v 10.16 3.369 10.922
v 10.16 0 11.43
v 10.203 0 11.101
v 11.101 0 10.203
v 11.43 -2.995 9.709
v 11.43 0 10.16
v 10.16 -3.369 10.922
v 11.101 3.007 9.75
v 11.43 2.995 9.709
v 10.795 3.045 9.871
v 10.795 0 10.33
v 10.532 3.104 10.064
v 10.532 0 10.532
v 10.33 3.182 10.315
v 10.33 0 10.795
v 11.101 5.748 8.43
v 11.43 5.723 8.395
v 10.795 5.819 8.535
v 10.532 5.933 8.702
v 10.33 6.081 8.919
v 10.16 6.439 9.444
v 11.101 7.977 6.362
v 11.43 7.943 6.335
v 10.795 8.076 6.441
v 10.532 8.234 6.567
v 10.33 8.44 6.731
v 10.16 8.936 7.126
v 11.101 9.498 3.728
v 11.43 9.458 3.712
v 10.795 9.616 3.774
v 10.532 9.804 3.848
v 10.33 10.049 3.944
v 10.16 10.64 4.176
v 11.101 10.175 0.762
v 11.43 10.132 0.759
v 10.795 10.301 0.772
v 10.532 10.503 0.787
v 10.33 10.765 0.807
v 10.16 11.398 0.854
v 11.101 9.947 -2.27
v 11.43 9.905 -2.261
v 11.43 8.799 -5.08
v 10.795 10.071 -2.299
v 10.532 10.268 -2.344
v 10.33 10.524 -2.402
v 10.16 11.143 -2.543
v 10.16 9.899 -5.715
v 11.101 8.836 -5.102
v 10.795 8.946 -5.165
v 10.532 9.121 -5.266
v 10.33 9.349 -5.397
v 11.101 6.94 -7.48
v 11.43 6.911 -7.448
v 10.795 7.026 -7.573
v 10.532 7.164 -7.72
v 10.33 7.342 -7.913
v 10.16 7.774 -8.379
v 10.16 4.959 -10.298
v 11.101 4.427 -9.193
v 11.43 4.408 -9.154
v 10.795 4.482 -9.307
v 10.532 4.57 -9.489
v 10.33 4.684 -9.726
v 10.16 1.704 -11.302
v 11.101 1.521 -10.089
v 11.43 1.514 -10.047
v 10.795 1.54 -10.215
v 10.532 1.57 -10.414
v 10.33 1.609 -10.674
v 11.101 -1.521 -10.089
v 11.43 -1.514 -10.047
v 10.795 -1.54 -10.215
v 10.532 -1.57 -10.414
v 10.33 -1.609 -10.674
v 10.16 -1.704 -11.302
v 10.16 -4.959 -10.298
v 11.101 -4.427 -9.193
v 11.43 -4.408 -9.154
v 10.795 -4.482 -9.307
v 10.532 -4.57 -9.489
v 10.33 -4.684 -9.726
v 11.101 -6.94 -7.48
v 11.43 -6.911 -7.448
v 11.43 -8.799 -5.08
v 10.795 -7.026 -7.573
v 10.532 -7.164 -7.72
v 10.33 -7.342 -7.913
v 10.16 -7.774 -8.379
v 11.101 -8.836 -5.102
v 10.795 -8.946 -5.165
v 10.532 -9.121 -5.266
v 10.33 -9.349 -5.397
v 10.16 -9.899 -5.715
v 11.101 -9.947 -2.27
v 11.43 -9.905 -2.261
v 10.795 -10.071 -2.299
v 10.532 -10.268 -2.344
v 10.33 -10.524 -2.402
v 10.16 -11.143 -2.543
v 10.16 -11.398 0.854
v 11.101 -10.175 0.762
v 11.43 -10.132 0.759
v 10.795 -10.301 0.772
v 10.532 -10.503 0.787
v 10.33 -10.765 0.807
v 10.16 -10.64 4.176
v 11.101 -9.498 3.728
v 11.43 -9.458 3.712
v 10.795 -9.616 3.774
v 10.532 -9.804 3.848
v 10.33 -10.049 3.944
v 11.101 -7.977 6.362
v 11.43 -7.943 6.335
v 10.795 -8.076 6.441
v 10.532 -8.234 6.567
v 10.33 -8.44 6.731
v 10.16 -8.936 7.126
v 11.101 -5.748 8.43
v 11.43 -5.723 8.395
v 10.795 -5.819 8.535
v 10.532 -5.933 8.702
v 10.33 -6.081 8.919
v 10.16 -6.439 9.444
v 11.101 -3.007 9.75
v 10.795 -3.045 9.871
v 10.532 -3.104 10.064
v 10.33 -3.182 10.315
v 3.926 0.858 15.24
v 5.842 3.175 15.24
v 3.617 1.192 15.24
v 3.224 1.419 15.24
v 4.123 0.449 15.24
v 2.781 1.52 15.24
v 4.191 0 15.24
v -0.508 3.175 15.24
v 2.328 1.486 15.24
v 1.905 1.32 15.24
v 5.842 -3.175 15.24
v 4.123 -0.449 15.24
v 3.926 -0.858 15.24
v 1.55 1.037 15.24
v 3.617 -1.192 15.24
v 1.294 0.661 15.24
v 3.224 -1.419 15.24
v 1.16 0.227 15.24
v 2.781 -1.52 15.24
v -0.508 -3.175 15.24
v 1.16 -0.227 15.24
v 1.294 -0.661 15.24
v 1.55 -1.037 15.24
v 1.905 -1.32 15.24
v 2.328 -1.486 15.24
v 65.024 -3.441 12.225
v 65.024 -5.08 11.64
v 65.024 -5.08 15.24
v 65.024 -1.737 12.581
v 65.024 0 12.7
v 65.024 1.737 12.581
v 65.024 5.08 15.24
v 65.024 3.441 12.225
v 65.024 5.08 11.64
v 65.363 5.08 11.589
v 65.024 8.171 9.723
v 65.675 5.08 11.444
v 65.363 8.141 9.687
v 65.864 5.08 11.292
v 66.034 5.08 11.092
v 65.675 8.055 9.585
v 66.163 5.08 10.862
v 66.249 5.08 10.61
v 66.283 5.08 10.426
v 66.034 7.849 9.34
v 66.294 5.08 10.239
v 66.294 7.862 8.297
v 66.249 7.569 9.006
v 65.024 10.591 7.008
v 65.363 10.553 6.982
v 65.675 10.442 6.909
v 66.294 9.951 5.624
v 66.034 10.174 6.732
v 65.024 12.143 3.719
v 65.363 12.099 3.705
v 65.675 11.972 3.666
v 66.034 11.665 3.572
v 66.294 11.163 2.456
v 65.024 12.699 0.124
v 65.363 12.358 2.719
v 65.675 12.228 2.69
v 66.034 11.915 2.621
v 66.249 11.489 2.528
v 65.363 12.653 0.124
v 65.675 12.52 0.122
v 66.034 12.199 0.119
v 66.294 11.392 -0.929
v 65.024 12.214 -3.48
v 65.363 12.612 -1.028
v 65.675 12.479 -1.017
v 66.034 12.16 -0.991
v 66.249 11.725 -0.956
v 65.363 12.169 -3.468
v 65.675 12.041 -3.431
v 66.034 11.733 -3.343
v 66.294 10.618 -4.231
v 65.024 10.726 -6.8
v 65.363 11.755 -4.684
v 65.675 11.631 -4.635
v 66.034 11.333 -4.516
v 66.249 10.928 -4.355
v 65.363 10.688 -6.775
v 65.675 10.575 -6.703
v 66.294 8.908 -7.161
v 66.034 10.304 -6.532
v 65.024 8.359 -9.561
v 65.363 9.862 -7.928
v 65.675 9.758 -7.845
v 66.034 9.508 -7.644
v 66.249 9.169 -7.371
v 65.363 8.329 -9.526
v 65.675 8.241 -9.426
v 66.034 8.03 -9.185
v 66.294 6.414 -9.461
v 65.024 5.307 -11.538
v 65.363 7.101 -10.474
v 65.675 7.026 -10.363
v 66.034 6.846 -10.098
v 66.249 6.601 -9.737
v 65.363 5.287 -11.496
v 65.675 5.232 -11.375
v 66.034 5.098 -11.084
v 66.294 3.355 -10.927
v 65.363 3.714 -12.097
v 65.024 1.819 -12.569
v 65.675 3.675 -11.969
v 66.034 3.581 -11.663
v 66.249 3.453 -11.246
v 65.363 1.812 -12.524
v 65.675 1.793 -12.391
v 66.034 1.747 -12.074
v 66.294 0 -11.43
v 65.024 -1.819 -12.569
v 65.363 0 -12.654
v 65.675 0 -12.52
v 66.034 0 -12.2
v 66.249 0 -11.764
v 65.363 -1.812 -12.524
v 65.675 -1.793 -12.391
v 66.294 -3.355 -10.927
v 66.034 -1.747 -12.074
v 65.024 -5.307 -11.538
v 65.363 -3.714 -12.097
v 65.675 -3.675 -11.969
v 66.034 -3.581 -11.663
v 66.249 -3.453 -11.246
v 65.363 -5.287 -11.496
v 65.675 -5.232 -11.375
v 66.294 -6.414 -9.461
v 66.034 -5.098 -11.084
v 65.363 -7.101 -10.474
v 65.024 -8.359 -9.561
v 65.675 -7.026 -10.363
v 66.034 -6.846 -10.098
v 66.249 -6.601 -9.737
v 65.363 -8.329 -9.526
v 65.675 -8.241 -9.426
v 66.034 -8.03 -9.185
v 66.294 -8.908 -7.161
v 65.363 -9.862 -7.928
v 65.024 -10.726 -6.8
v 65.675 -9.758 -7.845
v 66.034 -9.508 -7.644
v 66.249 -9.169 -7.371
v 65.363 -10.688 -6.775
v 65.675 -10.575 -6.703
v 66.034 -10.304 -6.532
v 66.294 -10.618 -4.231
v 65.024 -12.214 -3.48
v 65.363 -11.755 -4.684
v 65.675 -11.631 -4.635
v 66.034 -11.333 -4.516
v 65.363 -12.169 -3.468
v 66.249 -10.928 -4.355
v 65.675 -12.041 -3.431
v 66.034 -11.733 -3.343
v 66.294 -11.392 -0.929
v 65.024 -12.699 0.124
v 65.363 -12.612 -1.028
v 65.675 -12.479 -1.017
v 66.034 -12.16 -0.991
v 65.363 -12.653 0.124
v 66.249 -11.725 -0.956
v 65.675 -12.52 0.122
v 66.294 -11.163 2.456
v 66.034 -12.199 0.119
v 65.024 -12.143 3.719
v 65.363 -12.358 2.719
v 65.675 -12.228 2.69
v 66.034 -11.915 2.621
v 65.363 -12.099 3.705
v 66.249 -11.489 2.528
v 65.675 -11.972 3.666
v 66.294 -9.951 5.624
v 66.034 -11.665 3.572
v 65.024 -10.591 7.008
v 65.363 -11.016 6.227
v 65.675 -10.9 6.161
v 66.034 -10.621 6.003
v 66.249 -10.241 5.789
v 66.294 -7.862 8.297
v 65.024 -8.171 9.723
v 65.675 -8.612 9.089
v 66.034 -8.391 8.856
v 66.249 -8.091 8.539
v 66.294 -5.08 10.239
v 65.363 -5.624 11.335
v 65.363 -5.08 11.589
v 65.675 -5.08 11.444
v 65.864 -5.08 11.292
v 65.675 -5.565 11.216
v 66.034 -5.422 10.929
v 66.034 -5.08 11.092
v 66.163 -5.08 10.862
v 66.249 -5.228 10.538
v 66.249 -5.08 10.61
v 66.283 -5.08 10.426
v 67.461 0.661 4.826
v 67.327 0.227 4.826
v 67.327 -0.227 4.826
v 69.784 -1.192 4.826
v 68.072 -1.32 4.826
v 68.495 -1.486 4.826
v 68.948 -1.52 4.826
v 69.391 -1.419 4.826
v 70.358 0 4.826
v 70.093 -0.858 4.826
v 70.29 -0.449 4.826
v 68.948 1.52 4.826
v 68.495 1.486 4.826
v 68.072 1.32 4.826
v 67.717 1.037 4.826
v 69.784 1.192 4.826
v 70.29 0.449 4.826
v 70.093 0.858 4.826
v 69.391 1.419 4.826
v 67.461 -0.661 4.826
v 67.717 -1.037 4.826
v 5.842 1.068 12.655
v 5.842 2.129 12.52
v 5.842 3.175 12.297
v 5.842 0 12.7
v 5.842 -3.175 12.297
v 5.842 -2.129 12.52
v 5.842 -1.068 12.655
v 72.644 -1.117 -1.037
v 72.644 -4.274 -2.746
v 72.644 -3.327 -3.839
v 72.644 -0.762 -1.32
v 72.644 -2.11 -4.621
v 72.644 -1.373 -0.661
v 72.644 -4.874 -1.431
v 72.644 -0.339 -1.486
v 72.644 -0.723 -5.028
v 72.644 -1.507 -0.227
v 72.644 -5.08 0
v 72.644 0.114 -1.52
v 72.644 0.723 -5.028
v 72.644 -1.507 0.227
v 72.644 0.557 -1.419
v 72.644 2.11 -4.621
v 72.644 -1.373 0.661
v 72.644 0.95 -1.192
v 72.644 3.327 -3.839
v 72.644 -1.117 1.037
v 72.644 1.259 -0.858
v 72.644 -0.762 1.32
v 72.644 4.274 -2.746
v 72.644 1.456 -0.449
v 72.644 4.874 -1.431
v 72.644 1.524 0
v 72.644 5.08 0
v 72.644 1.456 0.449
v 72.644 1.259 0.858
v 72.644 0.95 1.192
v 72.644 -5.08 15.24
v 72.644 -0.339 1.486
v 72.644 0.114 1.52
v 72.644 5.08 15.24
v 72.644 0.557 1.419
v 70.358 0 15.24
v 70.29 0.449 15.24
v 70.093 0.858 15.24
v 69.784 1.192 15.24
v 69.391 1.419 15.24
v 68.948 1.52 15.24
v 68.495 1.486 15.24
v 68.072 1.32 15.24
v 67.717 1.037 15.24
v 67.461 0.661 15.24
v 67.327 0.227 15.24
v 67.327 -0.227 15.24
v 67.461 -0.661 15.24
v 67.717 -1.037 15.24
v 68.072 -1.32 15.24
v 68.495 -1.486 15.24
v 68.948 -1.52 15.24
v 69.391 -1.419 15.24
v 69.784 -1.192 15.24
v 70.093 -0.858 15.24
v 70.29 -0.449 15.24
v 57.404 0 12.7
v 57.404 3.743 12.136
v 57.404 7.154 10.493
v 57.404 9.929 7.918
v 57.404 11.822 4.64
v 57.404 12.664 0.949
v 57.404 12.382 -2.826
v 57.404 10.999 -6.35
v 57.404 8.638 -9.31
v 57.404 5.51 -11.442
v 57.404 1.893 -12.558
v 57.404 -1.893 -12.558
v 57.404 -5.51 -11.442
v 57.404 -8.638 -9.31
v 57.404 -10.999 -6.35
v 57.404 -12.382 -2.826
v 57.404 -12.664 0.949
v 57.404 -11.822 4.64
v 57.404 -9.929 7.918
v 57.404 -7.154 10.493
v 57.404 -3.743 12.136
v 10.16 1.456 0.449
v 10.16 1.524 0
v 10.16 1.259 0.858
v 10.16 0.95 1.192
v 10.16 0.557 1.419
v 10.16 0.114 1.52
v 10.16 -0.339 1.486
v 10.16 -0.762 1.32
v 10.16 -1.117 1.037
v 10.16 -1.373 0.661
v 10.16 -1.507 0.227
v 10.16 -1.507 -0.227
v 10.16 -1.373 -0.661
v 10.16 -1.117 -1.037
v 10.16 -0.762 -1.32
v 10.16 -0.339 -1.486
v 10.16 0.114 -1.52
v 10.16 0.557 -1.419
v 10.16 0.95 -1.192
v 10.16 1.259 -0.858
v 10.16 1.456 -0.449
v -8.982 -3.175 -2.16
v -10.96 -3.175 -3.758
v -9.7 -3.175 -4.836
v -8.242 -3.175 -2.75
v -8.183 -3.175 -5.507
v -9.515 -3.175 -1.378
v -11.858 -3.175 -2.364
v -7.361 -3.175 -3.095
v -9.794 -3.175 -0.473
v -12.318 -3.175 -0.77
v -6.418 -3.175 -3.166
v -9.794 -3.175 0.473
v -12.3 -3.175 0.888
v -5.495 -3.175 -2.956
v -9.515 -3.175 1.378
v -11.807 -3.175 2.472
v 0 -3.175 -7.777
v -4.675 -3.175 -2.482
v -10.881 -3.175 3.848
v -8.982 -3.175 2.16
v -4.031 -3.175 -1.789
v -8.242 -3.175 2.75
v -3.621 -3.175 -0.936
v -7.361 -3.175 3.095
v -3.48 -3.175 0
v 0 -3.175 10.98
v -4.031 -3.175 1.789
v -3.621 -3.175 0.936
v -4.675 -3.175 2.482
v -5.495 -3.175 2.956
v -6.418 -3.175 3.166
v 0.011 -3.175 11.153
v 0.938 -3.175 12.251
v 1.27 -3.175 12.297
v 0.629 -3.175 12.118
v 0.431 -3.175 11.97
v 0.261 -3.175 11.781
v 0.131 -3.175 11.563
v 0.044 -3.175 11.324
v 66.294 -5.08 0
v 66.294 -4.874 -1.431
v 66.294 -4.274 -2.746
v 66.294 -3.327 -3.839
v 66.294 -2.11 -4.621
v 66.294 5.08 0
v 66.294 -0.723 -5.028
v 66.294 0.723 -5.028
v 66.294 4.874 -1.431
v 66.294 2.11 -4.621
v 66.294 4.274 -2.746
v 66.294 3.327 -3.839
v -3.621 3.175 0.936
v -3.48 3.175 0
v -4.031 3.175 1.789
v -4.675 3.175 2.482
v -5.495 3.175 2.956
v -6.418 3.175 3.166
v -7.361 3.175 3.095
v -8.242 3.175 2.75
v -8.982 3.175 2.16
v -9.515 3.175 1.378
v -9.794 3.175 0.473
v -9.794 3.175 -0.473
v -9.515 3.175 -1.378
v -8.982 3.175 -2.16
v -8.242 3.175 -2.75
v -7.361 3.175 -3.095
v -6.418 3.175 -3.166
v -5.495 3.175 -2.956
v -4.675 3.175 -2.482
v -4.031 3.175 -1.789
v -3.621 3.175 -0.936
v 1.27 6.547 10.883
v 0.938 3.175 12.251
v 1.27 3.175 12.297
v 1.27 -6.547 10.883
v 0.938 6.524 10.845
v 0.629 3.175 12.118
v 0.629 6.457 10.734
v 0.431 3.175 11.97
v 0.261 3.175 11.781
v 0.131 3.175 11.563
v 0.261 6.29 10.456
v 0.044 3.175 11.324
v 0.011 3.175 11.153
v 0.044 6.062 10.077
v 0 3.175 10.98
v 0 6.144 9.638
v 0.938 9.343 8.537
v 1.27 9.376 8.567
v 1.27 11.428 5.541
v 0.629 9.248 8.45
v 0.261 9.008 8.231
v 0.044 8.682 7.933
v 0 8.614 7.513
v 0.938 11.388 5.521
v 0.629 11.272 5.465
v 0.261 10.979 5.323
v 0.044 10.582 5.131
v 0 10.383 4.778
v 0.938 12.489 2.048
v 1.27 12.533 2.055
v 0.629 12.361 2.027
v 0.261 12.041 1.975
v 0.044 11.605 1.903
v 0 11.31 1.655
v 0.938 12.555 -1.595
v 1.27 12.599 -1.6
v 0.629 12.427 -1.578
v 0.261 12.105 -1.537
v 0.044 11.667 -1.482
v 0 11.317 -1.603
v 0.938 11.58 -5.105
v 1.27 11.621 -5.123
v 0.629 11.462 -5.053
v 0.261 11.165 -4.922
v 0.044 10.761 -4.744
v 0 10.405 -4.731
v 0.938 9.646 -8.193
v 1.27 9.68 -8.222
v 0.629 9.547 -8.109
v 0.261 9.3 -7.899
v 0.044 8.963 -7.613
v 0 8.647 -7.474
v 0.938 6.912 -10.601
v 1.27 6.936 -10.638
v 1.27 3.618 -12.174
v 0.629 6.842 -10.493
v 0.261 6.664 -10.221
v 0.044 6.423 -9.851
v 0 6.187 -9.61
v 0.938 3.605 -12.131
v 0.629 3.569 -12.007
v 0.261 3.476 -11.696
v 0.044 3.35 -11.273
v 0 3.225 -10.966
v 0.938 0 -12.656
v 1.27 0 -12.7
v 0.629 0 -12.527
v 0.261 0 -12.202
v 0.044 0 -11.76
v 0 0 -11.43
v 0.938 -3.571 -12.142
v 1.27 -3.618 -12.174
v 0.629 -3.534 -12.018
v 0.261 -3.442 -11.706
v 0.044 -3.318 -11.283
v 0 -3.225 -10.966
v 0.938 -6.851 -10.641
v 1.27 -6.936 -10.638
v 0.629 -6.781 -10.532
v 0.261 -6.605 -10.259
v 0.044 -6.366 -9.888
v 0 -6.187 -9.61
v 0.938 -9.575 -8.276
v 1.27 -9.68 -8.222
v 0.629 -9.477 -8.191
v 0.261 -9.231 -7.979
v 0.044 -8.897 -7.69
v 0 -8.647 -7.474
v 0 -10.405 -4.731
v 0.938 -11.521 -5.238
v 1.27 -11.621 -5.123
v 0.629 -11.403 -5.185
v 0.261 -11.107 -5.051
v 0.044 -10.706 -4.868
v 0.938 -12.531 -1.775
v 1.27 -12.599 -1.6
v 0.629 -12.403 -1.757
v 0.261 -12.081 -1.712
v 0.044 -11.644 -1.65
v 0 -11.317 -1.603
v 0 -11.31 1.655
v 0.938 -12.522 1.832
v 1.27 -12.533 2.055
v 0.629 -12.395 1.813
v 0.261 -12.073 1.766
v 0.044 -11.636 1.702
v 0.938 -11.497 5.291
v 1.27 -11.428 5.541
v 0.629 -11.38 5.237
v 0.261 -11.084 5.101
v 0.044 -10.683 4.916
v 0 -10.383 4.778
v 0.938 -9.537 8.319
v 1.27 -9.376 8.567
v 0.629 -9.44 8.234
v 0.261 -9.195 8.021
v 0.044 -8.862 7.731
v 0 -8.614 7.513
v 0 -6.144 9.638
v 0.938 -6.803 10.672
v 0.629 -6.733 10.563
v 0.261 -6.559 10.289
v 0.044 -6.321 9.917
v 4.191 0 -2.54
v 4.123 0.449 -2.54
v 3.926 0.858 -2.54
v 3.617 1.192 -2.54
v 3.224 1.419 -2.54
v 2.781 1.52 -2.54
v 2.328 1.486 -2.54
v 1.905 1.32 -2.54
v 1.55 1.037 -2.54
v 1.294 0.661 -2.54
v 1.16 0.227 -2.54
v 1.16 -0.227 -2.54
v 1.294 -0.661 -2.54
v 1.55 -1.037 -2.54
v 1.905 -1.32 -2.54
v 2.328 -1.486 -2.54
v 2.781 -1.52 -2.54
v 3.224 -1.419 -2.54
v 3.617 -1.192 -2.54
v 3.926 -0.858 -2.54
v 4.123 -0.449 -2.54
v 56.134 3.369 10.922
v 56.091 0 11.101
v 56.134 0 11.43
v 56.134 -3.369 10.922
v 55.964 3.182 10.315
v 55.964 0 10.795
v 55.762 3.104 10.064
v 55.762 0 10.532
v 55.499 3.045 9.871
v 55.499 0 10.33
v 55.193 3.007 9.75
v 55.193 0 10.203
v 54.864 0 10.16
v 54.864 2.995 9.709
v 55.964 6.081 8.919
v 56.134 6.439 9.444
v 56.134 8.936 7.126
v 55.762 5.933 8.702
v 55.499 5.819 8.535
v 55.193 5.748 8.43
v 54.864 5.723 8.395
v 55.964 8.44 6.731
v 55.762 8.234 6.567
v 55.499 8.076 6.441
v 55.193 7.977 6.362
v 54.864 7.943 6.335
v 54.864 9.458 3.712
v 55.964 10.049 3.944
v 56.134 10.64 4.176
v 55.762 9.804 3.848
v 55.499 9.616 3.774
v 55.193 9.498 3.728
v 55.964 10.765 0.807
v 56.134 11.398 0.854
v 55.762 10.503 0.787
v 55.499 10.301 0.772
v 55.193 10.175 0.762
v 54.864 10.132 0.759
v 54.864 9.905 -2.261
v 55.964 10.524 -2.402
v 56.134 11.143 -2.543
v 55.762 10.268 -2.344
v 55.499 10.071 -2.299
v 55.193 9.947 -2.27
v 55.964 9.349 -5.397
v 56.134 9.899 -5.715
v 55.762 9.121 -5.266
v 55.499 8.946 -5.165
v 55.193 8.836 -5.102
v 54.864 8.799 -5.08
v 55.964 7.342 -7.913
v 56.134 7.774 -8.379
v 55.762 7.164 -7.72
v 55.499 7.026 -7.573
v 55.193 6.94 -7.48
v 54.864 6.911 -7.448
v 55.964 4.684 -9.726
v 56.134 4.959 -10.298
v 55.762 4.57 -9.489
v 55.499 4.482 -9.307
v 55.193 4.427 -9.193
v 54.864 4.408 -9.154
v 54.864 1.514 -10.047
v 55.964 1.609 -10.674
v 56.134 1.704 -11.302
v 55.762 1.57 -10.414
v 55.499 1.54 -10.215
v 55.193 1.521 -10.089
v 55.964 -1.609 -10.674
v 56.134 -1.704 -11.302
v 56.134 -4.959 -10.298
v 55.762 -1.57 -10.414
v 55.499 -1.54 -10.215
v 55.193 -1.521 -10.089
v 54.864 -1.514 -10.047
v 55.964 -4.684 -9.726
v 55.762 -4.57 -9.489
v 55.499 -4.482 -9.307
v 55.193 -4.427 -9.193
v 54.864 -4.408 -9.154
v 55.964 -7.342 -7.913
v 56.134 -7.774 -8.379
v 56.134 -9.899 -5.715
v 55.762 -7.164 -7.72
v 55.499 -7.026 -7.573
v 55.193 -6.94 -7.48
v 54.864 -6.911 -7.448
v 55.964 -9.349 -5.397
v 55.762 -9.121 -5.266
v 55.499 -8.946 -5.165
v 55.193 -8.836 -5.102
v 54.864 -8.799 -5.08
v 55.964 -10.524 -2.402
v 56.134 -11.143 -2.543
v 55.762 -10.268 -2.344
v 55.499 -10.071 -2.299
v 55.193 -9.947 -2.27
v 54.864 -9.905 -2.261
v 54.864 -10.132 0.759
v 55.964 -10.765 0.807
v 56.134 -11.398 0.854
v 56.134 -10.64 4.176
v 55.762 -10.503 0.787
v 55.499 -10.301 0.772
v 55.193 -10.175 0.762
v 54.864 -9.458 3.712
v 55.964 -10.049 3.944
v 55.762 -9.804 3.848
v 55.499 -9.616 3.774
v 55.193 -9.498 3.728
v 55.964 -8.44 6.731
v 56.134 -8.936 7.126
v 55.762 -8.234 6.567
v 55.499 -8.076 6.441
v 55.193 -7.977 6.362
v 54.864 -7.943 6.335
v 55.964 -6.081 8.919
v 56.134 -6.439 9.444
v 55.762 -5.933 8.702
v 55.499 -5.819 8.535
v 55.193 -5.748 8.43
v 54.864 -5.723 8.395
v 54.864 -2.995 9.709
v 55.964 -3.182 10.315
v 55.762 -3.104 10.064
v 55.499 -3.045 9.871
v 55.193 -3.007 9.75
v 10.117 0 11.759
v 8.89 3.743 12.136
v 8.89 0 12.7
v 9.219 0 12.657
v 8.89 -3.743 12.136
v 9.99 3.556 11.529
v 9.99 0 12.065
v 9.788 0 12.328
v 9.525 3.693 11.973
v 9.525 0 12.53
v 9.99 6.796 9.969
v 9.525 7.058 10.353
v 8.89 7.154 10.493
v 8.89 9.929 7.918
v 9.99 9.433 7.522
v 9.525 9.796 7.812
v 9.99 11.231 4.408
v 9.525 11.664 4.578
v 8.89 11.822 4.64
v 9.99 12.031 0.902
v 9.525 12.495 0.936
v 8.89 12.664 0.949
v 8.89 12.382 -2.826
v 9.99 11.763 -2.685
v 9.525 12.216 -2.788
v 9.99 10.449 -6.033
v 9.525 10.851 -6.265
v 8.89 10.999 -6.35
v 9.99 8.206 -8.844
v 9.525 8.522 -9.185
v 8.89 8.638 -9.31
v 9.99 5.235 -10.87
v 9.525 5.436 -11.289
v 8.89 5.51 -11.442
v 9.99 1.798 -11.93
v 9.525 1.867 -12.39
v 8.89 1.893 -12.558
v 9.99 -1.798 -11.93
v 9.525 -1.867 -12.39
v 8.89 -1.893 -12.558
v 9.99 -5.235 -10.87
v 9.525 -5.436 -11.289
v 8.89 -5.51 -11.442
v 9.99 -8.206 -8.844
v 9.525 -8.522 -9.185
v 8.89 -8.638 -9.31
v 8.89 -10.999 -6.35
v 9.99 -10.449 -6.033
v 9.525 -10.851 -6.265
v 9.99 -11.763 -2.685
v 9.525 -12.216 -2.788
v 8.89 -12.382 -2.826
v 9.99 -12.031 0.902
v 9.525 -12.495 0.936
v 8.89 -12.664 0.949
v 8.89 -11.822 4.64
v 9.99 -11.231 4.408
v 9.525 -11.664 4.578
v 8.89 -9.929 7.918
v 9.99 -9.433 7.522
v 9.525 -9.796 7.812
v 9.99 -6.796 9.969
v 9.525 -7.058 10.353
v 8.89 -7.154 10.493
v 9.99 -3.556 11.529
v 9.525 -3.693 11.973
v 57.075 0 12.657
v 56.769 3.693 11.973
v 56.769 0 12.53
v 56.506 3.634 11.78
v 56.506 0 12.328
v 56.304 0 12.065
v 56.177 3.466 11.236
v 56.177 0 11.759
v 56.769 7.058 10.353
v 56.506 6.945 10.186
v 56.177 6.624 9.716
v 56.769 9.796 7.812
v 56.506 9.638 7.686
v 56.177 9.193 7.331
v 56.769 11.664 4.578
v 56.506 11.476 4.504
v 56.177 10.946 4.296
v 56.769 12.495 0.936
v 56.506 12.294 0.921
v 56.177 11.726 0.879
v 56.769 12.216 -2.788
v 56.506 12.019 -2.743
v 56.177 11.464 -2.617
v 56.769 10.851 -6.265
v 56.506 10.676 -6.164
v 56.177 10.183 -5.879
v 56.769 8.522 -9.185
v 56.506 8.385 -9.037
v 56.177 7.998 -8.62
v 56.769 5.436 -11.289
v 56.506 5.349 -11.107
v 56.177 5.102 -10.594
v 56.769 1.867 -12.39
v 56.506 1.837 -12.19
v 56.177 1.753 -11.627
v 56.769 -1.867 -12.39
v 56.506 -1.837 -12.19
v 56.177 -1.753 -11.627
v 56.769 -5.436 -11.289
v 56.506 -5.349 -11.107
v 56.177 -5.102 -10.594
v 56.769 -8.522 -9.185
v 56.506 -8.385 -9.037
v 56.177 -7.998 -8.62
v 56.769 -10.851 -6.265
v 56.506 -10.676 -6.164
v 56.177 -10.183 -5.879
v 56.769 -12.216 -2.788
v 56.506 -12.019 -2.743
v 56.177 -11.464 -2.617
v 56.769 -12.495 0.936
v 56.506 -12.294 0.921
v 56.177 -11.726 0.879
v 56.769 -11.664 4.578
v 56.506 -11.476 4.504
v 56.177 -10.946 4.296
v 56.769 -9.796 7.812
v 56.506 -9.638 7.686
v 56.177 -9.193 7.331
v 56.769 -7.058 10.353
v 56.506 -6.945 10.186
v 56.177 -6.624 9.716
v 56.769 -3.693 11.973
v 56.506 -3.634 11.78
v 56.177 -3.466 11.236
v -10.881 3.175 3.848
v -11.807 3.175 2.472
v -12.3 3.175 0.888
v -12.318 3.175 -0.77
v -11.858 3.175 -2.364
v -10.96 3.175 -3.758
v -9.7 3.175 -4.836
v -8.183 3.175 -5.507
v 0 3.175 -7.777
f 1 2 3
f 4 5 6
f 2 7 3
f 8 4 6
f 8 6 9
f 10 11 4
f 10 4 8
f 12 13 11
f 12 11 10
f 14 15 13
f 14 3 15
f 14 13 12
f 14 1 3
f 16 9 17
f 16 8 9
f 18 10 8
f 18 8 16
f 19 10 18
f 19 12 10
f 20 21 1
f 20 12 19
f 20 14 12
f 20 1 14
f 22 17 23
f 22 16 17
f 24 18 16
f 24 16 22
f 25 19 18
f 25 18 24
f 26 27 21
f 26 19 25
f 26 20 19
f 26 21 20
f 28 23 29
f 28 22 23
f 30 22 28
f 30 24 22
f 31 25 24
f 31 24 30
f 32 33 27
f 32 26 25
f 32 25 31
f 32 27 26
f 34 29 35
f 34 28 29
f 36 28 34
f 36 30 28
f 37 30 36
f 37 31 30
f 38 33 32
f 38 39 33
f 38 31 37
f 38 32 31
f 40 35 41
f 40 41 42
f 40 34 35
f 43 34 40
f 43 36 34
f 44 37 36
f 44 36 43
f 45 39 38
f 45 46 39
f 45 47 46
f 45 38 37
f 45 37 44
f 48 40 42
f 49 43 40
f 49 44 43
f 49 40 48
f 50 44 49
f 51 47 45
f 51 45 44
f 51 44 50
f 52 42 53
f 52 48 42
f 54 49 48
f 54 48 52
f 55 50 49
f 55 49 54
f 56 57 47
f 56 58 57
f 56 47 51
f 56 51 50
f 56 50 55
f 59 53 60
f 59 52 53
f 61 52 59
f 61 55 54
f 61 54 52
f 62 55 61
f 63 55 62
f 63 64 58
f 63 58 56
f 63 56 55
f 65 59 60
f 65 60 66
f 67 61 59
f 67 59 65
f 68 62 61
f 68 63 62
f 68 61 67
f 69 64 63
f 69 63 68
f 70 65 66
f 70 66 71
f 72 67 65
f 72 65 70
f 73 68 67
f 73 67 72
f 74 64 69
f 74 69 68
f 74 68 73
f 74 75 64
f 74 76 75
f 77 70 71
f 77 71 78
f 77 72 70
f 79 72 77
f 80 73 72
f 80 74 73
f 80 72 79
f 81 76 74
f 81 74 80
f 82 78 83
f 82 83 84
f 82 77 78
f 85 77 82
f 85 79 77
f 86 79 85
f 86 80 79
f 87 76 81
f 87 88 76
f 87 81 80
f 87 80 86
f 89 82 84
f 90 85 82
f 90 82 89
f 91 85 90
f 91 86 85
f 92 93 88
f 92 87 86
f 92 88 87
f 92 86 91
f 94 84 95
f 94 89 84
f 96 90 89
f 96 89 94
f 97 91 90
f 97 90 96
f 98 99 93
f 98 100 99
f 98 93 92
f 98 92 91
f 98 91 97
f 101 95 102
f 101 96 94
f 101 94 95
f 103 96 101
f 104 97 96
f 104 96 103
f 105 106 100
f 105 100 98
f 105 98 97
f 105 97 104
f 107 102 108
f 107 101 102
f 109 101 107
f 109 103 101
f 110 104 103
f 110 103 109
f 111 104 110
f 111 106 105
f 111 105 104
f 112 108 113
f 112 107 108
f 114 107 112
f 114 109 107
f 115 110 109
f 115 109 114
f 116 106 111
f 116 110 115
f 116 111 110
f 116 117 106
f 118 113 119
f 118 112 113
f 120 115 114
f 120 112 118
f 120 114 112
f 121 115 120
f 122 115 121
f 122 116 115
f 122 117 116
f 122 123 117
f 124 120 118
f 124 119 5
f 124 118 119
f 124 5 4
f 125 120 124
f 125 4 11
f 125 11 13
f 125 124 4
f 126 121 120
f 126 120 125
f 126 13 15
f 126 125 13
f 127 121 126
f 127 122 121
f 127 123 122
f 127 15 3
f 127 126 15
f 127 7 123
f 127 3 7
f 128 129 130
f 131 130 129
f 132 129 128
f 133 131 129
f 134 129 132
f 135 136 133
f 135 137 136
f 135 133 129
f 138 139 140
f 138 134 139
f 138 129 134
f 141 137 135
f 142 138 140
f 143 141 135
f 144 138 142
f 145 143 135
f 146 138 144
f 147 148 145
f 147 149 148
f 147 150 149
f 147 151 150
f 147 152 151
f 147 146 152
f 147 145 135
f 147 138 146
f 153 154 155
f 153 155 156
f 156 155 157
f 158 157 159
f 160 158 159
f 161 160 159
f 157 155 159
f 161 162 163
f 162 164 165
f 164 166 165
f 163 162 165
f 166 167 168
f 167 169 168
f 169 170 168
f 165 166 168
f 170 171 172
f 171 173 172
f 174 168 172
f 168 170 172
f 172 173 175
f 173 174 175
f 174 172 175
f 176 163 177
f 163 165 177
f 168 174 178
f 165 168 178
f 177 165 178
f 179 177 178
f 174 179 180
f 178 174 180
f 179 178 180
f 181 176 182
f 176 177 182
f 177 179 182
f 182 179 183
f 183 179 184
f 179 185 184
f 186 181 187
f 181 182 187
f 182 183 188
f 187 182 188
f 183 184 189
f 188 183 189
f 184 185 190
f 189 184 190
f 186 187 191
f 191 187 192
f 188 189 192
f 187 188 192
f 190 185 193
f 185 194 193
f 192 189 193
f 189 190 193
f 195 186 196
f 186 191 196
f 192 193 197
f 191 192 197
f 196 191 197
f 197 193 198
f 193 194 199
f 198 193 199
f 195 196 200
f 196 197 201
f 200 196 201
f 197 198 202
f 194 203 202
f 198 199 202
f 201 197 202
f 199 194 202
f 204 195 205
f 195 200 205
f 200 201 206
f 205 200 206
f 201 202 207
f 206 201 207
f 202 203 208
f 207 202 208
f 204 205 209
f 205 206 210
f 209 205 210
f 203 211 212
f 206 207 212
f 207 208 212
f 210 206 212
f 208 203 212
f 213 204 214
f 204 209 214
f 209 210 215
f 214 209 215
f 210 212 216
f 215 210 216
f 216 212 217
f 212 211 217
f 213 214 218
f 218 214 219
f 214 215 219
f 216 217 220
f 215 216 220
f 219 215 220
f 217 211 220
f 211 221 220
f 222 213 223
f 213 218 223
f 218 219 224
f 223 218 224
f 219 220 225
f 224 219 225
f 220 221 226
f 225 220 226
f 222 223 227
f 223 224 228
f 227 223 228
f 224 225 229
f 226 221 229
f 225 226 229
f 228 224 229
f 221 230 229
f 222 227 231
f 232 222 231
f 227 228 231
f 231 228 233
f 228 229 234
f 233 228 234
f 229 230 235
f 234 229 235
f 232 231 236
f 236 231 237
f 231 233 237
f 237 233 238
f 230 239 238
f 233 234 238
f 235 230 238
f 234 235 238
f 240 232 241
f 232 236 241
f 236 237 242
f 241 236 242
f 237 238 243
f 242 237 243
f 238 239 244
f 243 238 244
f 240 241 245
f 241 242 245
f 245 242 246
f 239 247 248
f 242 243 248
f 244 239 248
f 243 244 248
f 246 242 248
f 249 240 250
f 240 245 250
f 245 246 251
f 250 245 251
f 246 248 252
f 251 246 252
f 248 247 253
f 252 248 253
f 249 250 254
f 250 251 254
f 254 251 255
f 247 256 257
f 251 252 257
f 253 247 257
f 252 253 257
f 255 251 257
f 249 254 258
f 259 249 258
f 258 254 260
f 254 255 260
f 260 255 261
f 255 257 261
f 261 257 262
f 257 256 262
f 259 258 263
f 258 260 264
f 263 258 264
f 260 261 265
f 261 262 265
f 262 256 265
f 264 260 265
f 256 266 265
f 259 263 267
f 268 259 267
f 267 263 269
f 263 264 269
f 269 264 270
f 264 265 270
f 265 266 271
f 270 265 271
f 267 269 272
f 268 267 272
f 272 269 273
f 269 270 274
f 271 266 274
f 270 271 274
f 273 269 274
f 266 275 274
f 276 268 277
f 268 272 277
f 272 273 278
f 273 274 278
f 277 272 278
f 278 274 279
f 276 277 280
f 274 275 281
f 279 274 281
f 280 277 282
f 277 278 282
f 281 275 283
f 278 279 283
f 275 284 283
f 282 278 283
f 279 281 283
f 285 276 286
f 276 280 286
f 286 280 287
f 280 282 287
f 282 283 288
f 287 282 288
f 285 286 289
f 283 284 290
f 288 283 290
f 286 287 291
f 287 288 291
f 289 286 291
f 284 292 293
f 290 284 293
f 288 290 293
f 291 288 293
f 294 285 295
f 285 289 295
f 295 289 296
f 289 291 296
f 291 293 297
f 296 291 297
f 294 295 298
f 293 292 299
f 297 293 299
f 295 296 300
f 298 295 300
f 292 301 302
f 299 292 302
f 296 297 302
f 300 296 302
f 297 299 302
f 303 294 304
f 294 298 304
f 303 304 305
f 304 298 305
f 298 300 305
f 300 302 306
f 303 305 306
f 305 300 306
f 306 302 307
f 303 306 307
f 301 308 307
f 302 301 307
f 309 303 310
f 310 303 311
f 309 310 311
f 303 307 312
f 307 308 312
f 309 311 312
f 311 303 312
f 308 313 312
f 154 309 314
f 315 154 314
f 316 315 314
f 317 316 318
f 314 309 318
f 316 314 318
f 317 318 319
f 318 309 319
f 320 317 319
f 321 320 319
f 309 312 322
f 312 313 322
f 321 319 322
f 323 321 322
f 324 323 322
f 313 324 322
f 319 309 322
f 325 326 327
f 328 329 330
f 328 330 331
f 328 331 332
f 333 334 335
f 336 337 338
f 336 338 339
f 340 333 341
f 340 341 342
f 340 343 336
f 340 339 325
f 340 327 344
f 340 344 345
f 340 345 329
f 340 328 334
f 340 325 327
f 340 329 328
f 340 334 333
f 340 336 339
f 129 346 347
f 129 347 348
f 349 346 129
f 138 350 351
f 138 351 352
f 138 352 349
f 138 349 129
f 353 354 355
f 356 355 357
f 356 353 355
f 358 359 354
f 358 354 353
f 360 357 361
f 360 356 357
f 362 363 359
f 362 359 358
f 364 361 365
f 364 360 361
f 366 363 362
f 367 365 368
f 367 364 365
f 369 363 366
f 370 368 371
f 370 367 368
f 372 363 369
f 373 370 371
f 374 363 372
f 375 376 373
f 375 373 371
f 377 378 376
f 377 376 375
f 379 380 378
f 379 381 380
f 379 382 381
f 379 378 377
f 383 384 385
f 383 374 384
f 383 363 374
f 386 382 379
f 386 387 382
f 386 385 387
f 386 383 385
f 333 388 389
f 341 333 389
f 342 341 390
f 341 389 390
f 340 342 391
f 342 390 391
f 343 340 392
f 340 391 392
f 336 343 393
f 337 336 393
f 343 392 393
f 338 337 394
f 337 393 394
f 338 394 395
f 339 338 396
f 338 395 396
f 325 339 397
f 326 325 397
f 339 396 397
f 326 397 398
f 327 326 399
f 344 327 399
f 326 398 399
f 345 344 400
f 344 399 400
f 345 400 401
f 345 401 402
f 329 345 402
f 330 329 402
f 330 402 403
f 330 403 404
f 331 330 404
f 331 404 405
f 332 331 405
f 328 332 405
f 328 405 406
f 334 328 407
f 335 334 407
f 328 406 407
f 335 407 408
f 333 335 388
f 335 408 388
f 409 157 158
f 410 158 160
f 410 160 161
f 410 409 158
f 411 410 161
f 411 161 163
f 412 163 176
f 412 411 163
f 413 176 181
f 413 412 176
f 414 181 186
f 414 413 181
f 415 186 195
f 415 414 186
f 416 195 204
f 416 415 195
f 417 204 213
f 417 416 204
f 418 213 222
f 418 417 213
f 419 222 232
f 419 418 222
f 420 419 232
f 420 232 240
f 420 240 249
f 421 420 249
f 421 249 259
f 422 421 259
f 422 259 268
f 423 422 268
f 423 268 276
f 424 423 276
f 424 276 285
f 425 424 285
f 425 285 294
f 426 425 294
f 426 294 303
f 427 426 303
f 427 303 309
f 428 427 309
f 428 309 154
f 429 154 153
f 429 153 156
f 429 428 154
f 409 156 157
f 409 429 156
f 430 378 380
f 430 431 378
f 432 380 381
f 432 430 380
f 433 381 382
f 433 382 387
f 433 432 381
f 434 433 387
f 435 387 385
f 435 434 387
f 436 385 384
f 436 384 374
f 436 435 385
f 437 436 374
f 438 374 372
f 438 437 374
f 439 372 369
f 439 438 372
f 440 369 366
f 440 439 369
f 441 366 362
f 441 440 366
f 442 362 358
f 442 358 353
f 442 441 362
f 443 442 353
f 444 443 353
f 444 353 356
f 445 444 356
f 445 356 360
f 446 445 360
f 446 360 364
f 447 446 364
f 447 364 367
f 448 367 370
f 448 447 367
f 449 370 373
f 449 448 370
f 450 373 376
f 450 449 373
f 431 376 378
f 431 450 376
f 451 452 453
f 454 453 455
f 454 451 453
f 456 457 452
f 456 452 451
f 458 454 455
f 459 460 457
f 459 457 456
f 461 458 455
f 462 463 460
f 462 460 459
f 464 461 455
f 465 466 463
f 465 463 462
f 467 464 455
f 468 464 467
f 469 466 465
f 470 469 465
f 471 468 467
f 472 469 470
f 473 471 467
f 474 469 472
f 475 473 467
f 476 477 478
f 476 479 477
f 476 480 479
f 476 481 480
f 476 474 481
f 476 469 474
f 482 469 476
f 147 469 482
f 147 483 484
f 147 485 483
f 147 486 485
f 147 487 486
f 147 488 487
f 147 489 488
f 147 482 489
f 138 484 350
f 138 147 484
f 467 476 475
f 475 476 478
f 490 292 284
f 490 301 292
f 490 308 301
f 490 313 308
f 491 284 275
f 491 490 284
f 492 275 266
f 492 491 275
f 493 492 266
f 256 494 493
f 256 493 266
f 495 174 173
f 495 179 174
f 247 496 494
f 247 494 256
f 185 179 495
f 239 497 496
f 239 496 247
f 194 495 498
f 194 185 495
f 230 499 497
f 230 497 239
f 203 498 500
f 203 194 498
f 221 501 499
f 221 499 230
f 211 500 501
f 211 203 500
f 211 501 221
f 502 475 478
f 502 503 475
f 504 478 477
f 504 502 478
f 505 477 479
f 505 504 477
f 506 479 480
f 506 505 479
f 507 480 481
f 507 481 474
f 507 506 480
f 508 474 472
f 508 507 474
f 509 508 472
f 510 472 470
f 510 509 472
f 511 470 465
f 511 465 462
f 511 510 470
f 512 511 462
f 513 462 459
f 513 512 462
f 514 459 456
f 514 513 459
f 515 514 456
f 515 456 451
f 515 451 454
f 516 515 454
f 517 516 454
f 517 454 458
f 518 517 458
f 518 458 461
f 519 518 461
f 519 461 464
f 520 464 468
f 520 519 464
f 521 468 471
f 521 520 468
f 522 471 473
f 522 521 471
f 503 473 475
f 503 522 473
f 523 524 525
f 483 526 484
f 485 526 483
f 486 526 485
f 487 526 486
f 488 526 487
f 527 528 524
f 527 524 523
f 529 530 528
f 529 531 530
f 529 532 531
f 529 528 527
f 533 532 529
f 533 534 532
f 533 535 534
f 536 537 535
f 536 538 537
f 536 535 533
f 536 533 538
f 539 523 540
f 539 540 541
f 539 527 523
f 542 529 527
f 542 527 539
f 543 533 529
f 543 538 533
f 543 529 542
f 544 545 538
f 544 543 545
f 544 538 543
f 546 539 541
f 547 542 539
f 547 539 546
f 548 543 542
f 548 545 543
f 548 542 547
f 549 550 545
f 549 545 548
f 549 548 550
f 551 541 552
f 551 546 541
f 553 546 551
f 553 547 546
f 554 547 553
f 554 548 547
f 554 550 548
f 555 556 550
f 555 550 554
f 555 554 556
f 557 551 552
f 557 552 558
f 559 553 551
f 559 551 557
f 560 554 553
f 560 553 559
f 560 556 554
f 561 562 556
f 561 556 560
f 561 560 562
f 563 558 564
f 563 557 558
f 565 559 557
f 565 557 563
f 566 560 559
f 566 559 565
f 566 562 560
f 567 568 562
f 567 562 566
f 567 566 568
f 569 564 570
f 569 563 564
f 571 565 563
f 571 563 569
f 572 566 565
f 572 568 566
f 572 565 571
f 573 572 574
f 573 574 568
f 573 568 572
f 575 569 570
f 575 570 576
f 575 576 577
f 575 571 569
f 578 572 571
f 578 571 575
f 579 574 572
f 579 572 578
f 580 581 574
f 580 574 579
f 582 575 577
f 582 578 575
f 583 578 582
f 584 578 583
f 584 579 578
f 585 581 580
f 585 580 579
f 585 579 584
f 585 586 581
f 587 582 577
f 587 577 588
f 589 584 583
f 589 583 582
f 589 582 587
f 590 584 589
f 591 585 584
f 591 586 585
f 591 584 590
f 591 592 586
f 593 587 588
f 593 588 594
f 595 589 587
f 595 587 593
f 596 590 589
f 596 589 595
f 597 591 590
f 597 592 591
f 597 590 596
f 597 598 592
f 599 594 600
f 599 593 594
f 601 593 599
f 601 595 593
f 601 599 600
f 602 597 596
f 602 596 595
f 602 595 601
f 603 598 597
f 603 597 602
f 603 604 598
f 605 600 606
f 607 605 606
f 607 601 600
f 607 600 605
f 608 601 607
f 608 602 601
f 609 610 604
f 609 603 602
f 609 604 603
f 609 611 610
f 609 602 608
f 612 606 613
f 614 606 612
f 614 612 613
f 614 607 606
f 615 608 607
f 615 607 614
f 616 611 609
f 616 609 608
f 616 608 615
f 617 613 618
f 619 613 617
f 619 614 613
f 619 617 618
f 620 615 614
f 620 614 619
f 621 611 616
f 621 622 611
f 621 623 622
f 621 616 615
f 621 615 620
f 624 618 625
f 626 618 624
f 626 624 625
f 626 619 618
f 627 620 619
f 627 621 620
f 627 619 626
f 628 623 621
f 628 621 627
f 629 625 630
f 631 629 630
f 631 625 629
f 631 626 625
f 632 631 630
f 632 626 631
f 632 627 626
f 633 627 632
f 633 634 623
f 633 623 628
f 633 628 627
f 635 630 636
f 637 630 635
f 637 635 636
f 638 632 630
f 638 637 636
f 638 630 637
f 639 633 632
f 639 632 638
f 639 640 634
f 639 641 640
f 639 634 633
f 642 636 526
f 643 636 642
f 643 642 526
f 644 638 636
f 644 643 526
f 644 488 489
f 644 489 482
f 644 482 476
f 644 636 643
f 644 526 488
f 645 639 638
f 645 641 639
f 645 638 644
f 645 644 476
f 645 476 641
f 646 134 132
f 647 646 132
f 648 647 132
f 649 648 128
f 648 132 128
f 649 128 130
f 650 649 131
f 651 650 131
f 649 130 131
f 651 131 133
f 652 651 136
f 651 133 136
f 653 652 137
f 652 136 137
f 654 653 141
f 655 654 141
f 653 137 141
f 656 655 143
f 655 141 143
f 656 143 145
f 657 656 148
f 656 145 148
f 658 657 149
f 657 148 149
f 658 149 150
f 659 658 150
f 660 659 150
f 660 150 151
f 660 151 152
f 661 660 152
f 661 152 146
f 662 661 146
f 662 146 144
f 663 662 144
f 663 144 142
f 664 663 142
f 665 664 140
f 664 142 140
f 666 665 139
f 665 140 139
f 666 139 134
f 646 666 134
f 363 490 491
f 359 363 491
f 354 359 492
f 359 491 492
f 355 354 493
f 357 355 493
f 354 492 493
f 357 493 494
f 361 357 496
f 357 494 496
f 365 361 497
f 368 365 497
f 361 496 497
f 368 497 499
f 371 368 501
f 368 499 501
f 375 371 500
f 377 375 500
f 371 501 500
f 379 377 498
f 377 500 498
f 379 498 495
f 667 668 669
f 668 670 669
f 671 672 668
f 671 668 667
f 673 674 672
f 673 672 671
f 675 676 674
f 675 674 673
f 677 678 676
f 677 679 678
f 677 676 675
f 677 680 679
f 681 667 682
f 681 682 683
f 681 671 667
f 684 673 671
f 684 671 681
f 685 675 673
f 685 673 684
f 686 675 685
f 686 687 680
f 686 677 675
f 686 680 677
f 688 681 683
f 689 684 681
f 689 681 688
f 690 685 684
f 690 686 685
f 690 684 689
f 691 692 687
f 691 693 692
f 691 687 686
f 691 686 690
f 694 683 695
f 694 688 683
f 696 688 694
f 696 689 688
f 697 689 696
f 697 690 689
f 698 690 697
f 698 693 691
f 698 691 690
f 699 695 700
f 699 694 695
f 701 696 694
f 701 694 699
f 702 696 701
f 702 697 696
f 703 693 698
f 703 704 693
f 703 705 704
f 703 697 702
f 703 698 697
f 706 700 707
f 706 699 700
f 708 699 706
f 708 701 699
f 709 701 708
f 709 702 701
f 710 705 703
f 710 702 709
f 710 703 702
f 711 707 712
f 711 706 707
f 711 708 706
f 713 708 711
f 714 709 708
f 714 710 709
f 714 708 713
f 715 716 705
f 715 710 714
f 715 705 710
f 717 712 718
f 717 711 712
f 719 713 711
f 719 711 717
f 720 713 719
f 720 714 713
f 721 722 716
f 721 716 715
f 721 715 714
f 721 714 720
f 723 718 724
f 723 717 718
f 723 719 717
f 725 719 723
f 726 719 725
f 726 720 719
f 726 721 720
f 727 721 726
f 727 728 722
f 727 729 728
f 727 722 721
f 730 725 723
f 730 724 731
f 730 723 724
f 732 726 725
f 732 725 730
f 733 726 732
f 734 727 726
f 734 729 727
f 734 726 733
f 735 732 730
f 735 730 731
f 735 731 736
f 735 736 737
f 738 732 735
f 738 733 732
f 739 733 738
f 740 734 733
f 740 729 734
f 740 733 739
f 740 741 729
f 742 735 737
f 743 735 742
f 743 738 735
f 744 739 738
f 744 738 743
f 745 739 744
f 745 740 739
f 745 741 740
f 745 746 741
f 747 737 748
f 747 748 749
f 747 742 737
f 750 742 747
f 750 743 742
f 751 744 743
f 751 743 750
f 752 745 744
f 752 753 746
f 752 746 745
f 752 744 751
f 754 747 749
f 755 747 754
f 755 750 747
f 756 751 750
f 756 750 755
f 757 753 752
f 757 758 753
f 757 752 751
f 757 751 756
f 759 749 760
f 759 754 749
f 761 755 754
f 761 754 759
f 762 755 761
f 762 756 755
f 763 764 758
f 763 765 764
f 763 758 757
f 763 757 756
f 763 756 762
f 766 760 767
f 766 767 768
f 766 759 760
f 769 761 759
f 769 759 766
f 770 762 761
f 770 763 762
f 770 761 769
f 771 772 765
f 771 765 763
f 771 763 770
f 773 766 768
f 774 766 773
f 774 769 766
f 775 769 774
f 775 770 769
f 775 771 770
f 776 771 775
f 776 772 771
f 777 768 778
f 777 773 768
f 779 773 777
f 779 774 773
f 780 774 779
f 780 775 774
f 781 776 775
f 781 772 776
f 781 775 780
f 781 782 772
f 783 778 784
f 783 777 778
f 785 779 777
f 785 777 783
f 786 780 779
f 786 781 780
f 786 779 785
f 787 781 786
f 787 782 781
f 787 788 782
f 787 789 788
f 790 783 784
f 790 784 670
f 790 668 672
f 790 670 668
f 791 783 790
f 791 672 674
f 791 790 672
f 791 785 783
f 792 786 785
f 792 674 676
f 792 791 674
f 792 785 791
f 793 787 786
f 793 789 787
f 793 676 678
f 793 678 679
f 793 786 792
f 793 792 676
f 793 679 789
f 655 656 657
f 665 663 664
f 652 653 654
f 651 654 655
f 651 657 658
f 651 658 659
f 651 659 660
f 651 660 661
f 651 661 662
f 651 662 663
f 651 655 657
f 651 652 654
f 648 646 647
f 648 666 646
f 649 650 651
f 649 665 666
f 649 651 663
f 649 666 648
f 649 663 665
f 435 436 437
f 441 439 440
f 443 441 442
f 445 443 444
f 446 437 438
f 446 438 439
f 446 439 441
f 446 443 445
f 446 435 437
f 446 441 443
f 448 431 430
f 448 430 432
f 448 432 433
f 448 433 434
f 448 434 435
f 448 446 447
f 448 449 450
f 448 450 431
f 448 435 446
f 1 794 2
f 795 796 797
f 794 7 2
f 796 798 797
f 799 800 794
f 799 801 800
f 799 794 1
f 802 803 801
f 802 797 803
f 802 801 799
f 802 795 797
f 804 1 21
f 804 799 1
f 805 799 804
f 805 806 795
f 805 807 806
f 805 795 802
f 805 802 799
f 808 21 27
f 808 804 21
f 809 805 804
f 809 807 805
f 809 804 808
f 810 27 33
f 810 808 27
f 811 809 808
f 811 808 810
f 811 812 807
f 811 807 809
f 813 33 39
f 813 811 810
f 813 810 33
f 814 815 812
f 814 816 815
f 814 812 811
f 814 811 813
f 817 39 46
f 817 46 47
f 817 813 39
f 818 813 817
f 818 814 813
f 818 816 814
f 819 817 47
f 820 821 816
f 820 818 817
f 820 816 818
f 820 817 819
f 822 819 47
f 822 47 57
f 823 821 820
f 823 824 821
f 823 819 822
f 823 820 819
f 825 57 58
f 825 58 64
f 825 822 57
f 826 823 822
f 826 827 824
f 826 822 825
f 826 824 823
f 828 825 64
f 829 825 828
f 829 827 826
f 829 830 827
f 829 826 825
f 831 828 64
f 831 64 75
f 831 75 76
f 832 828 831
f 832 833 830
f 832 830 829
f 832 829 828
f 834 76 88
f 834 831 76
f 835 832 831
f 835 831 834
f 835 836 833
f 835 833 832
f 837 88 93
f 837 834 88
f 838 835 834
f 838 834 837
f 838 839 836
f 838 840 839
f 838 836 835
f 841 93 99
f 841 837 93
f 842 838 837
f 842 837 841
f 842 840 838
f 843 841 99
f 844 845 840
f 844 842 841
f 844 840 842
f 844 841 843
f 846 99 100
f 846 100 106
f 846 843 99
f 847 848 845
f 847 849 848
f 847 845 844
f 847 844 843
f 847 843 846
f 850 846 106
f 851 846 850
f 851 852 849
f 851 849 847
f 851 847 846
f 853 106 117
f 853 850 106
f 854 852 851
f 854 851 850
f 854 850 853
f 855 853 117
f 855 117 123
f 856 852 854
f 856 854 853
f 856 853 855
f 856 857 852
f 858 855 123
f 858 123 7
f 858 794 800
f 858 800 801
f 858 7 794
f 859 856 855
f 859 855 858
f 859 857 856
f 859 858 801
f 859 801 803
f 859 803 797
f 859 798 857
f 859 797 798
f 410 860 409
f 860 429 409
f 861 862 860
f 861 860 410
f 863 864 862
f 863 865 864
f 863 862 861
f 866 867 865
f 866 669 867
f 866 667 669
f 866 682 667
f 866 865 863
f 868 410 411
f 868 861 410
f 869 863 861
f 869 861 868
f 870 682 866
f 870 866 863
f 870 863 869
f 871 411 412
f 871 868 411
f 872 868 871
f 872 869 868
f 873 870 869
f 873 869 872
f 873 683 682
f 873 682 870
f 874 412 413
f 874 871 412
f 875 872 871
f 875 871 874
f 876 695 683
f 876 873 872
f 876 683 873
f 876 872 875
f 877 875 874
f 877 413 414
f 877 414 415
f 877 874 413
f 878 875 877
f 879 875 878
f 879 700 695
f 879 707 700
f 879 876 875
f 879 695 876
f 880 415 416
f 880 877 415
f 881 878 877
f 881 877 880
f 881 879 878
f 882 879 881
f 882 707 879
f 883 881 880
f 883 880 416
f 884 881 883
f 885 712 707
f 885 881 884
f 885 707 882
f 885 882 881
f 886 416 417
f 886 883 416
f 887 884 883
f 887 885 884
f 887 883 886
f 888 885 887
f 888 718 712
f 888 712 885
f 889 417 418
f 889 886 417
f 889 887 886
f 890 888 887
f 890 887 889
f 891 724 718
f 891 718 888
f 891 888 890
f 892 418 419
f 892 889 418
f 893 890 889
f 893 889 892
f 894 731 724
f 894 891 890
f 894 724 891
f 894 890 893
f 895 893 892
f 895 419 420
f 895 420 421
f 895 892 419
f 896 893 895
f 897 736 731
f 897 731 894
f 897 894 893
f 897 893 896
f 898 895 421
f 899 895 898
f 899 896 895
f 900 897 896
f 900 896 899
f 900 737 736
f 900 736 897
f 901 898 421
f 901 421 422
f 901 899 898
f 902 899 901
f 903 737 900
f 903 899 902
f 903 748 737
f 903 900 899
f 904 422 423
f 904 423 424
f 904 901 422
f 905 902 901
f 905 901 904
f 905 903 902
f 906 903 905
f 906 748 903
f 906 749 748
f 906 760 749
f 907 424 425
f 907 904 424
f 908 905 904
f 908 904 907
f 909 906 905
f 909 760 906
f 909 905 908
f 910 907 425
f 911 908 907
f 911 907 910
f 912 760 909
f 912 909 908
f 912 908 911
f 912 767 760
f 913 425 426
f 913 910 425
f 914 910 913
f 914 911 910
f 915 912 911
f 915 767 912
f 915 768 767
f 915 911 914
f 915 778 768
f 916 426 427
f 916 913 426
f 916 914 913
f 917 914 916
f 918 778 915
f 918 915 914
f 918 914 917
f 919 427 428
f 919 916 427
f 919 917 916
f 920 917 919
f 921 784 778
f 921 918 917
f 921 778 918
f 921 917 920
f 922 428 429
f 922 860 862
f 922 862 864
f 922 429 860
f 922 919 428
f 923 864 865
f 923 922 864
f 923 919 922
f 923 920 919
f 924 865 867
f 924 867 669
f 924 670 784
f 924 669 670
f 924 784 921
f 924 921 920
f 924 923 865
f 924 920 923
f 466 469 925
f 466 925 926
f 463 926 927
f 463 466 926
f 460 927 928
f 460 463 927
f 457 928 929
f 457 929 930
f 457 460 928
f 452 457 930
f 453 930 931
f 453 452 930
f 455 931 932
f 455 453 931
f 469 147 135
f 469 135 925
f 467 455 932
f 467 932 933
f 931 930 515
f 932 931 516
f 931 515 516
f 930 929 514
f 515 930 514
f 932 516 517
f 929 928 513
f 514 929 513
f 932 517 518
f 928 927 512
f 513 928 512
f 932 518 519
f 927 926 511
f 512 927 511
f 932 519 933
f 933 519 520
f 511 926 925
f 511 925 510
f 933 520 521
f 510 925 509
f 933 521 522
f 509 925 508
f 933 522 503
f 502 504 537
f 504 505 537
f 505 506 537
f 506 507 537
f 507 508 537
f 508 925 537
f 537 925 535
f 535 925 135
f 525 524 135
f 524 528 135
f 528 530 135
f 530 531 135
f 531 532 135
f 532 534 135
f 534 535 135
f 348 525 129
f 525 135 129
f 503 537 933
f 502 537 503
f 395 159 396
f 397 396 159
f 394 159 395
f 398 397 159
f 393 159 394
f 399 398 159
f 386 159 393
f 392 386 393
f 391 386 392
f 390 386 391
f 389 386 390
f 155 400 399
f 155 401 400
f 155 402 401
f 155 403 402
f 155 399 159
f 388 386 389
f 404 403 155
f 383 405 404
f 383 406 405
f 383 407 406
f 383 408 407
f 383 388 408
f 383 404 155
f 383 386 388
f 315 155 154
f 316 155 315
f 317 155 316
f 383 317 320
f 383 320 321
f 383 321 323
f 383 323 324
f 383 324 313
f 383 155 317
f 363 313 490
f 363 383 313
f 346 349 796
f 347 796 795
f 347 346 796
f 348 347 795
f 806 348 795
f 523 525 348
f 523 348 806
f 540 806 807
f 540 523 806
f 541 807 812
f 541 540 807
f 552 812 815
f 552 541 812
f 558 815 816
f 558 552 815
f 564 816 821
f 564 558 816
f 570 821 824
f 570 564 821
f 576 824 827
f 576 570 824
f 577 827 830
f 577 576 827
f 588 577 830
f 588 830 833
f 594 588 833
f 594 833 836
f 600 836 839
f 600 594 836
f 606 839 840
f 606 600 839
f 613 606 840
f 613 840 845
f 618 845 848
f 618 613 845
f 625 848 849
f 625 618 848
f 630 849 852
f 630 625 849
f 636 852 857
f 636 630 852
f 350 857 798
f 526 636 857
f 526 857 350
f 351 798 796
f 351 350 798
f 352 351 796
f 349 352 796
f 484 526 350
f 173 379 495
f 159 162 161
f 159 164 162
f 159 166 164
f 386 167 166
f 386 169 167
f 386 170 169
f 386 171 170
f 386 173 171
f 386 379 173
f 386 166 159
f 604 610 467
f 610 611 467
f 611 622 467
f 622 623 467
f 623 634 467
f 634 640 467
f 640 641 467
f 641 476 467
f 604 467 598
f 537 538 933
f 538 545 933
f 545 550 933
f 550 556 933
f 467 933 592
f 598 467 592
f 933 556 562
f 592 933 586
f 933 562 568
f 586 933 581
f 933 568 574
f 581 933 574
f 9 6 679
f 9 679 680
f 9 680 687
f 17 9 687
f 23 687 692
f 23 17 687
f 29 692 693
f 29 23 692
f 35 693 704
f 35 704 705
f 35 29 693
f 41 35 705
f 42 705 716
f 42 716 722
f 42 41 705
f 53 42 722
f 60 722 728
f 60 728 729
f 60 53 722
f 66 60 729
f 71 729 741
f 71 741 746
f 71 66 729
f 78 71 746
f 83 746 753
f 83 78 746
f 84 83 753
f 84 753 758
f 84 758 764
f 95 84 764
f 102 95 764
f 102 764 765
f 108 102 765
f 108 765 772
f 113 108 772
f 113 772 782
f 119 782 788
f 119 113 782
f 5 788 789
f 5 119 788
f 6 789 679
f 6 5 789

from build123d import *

# Parameters (mm, degrees)
F0_W          = 5.842
F0_H          = 12.7
F0_R          = 3.175
F2_DEPTH      = 3.175
F3_R          = 1.524
F4_DEPTH      = 6.35
F4_DEPTH_BACK = 1.27
F5_DEPTH      = 56.134
F6_R          = 1.524
F7_DEPTH      = 17.78
F8_DEPTH      = 10.414
F9_R          = 1.26999


# Not quite as in the source:
# - a fillet or chamfer is up to 0.001 mm smaller than in the source, because OpenCascade refuses the exact size


with BuildPart() as f1:
    # F0 (on Front) → F1 (revolve)
    with BuildSketch(Plane.XZ):
        with Locations((2.921, 6.35)):
            Rectangle(F0_W, F0_H)
        Polygon((5.842, 12.7), (5.842, 0), (66.294, 0), (66.294, 12.7), (56.134, 12.7), (56.134, 10.16), (10.16, 10.16), (10.16, 12.7), align=None)
    revolve(axis=Axis((33.147, 0, 0), (-1, 0, 0)))

    # F0 (on Front) → F2 (join, symmetric)
    with BuildSketch(Plane.XZ):
        with BuildLine():
            Line((-0.9398, 0), (0, 0))
            Line((0, 0), (0, 12.7))
            Line((0, 12.7), (5.842, 12.7))
            Line((5.842, 12.7), (5.842, 15.24))
            Line((5.842, 15.24), (-0.508, 15.24))
            Line((-0.508, 15.24), (-10.8806298187, 3.8475430269))
            ThreePointArc((-10.8806298187, 3.8475430269), (-4.5919612295, 5.3297205562), (-0.9398, 0))
        make_face()
        with Locations((2.921, 6.35)):
            Rectangle(F0_W, F0_H)
        with BuildLine():
            Line((5.842, 0), (0, 0))
            Line((0, 0), (-0.9398, 0))
            ThreePointArc((-0.9398, 0), (-3.1957909266, -4.5493385486), (-8.1826630726, -5.5069827884))
            Line((-8.1826630726, -5.5069827884), (5.842, -9.398))
            Line((5.842, -9.398), (5.842, 0))
        make_face()
        with BuildLine():
            ThreePointArc((-8.1826630726, -5.5069827884), (-3.1957909266, -4.5493385486), (-0.9398, 0))
            ThreePointArc((-0.9398, 0), (-4.5919612295, 5.3297205562), (-10.8806298187, 3.8475430269))
            ThreePointArc((-10.8806298187, 3.8475430269), (-12.1459778134, -1.5837270034), (-8.1826630726, -5.5069827884))
        make_face()
        with Locations((-6.6548, 0)):
            Circle(F0_R, mode=Mode.SUBTRACT)
    extrude(amount=F2_DEPTH, both=True)

    # F3 (on face) → F4 (join, two sides)
    with BuildSketch(Plane.YZ.offset(66.294)) as f4_sk:
        with BuildLine():
            ThreePointArc((-5.08, 0), (0, -5.08), (5.08, 0))
            ThreePointArc((5.08, 0), (0, 5.08), (-5.08, 0))
        make_face()
        Circle(F3_R, mode=Mode.SUBTRACT)
        with BuildLine():
            ThreePointArc((-5.08, 11.6397422652), (0, 12.7), (5.08, 11.6397422652))
            Line((5.08, 11.6397422652), (5.08, 15.24))
            Line((5.08, 15.24), (-5.08, 15.24))
            Line((-5.08, 15.24), (-5.08, 11.6397422652))
        make_face()
        with BuildLine():
            ThreePointArc((-5.08, 0), (0, 5.08), (5.08, 0))
            Line((5.08, 0), (5.08, 11.6397422652))
            ThreePointArc((5.08, 11.6397422652), (0, 12.7), (-5.08, 11.6397422652))
            Line((-5.08, 11.6397422652), (-5.08, 0))
        make_face()
    extrude(amount=F4_DEPTH)
    extrude(f4_sk.sketch, amount=-F4_DEPTH_BACK)

    # F5 (cut, through all): a face of the model
    f5_faces = [f1.faces().sort_by_distance(p)[0] for p in [
        (66.294, 0, 0),
    ]]
    extrude(f5_faces, amount=-F5_DEPTH, mode=Mode.SUBTRACT)

    # F6 (on face) → F7 (cut)
    with BuildSketch(Plane.XY.offset(15.24)):
        with Locations((2.667, 0)):
            Circle(F6_R)
    extrude(amount=-F7_DEPTH, mode=Mode.SUBTRACT)

    # F6 (on face) → F8 (cut)
    with BuildSketch(Plane.XY.offset(15.24)):
        with Locations((68.834, 0)):
            Circle(F6_R)
    extrude(amount=-F8_DEPTH, mode=Mode.SUBTRACT)

    # F9 (radius 1.27 in the source; OpenCascade refuses exactly that, so slightly less here)
    f9_edges = [f1.edges().sort_by_distance(p)[0] for p in [
        (10.16, 0, -12.7),
        (56.134, 0, -12.7),
        (10.16, 0, -10.16),
        (56.134, 0, -10.16),
        (66.294, 0, -12.7),
        (0, 0, -12.7),
    ]]
    fillet(f9_edges, radius=F9_R)


solid = f1.part
